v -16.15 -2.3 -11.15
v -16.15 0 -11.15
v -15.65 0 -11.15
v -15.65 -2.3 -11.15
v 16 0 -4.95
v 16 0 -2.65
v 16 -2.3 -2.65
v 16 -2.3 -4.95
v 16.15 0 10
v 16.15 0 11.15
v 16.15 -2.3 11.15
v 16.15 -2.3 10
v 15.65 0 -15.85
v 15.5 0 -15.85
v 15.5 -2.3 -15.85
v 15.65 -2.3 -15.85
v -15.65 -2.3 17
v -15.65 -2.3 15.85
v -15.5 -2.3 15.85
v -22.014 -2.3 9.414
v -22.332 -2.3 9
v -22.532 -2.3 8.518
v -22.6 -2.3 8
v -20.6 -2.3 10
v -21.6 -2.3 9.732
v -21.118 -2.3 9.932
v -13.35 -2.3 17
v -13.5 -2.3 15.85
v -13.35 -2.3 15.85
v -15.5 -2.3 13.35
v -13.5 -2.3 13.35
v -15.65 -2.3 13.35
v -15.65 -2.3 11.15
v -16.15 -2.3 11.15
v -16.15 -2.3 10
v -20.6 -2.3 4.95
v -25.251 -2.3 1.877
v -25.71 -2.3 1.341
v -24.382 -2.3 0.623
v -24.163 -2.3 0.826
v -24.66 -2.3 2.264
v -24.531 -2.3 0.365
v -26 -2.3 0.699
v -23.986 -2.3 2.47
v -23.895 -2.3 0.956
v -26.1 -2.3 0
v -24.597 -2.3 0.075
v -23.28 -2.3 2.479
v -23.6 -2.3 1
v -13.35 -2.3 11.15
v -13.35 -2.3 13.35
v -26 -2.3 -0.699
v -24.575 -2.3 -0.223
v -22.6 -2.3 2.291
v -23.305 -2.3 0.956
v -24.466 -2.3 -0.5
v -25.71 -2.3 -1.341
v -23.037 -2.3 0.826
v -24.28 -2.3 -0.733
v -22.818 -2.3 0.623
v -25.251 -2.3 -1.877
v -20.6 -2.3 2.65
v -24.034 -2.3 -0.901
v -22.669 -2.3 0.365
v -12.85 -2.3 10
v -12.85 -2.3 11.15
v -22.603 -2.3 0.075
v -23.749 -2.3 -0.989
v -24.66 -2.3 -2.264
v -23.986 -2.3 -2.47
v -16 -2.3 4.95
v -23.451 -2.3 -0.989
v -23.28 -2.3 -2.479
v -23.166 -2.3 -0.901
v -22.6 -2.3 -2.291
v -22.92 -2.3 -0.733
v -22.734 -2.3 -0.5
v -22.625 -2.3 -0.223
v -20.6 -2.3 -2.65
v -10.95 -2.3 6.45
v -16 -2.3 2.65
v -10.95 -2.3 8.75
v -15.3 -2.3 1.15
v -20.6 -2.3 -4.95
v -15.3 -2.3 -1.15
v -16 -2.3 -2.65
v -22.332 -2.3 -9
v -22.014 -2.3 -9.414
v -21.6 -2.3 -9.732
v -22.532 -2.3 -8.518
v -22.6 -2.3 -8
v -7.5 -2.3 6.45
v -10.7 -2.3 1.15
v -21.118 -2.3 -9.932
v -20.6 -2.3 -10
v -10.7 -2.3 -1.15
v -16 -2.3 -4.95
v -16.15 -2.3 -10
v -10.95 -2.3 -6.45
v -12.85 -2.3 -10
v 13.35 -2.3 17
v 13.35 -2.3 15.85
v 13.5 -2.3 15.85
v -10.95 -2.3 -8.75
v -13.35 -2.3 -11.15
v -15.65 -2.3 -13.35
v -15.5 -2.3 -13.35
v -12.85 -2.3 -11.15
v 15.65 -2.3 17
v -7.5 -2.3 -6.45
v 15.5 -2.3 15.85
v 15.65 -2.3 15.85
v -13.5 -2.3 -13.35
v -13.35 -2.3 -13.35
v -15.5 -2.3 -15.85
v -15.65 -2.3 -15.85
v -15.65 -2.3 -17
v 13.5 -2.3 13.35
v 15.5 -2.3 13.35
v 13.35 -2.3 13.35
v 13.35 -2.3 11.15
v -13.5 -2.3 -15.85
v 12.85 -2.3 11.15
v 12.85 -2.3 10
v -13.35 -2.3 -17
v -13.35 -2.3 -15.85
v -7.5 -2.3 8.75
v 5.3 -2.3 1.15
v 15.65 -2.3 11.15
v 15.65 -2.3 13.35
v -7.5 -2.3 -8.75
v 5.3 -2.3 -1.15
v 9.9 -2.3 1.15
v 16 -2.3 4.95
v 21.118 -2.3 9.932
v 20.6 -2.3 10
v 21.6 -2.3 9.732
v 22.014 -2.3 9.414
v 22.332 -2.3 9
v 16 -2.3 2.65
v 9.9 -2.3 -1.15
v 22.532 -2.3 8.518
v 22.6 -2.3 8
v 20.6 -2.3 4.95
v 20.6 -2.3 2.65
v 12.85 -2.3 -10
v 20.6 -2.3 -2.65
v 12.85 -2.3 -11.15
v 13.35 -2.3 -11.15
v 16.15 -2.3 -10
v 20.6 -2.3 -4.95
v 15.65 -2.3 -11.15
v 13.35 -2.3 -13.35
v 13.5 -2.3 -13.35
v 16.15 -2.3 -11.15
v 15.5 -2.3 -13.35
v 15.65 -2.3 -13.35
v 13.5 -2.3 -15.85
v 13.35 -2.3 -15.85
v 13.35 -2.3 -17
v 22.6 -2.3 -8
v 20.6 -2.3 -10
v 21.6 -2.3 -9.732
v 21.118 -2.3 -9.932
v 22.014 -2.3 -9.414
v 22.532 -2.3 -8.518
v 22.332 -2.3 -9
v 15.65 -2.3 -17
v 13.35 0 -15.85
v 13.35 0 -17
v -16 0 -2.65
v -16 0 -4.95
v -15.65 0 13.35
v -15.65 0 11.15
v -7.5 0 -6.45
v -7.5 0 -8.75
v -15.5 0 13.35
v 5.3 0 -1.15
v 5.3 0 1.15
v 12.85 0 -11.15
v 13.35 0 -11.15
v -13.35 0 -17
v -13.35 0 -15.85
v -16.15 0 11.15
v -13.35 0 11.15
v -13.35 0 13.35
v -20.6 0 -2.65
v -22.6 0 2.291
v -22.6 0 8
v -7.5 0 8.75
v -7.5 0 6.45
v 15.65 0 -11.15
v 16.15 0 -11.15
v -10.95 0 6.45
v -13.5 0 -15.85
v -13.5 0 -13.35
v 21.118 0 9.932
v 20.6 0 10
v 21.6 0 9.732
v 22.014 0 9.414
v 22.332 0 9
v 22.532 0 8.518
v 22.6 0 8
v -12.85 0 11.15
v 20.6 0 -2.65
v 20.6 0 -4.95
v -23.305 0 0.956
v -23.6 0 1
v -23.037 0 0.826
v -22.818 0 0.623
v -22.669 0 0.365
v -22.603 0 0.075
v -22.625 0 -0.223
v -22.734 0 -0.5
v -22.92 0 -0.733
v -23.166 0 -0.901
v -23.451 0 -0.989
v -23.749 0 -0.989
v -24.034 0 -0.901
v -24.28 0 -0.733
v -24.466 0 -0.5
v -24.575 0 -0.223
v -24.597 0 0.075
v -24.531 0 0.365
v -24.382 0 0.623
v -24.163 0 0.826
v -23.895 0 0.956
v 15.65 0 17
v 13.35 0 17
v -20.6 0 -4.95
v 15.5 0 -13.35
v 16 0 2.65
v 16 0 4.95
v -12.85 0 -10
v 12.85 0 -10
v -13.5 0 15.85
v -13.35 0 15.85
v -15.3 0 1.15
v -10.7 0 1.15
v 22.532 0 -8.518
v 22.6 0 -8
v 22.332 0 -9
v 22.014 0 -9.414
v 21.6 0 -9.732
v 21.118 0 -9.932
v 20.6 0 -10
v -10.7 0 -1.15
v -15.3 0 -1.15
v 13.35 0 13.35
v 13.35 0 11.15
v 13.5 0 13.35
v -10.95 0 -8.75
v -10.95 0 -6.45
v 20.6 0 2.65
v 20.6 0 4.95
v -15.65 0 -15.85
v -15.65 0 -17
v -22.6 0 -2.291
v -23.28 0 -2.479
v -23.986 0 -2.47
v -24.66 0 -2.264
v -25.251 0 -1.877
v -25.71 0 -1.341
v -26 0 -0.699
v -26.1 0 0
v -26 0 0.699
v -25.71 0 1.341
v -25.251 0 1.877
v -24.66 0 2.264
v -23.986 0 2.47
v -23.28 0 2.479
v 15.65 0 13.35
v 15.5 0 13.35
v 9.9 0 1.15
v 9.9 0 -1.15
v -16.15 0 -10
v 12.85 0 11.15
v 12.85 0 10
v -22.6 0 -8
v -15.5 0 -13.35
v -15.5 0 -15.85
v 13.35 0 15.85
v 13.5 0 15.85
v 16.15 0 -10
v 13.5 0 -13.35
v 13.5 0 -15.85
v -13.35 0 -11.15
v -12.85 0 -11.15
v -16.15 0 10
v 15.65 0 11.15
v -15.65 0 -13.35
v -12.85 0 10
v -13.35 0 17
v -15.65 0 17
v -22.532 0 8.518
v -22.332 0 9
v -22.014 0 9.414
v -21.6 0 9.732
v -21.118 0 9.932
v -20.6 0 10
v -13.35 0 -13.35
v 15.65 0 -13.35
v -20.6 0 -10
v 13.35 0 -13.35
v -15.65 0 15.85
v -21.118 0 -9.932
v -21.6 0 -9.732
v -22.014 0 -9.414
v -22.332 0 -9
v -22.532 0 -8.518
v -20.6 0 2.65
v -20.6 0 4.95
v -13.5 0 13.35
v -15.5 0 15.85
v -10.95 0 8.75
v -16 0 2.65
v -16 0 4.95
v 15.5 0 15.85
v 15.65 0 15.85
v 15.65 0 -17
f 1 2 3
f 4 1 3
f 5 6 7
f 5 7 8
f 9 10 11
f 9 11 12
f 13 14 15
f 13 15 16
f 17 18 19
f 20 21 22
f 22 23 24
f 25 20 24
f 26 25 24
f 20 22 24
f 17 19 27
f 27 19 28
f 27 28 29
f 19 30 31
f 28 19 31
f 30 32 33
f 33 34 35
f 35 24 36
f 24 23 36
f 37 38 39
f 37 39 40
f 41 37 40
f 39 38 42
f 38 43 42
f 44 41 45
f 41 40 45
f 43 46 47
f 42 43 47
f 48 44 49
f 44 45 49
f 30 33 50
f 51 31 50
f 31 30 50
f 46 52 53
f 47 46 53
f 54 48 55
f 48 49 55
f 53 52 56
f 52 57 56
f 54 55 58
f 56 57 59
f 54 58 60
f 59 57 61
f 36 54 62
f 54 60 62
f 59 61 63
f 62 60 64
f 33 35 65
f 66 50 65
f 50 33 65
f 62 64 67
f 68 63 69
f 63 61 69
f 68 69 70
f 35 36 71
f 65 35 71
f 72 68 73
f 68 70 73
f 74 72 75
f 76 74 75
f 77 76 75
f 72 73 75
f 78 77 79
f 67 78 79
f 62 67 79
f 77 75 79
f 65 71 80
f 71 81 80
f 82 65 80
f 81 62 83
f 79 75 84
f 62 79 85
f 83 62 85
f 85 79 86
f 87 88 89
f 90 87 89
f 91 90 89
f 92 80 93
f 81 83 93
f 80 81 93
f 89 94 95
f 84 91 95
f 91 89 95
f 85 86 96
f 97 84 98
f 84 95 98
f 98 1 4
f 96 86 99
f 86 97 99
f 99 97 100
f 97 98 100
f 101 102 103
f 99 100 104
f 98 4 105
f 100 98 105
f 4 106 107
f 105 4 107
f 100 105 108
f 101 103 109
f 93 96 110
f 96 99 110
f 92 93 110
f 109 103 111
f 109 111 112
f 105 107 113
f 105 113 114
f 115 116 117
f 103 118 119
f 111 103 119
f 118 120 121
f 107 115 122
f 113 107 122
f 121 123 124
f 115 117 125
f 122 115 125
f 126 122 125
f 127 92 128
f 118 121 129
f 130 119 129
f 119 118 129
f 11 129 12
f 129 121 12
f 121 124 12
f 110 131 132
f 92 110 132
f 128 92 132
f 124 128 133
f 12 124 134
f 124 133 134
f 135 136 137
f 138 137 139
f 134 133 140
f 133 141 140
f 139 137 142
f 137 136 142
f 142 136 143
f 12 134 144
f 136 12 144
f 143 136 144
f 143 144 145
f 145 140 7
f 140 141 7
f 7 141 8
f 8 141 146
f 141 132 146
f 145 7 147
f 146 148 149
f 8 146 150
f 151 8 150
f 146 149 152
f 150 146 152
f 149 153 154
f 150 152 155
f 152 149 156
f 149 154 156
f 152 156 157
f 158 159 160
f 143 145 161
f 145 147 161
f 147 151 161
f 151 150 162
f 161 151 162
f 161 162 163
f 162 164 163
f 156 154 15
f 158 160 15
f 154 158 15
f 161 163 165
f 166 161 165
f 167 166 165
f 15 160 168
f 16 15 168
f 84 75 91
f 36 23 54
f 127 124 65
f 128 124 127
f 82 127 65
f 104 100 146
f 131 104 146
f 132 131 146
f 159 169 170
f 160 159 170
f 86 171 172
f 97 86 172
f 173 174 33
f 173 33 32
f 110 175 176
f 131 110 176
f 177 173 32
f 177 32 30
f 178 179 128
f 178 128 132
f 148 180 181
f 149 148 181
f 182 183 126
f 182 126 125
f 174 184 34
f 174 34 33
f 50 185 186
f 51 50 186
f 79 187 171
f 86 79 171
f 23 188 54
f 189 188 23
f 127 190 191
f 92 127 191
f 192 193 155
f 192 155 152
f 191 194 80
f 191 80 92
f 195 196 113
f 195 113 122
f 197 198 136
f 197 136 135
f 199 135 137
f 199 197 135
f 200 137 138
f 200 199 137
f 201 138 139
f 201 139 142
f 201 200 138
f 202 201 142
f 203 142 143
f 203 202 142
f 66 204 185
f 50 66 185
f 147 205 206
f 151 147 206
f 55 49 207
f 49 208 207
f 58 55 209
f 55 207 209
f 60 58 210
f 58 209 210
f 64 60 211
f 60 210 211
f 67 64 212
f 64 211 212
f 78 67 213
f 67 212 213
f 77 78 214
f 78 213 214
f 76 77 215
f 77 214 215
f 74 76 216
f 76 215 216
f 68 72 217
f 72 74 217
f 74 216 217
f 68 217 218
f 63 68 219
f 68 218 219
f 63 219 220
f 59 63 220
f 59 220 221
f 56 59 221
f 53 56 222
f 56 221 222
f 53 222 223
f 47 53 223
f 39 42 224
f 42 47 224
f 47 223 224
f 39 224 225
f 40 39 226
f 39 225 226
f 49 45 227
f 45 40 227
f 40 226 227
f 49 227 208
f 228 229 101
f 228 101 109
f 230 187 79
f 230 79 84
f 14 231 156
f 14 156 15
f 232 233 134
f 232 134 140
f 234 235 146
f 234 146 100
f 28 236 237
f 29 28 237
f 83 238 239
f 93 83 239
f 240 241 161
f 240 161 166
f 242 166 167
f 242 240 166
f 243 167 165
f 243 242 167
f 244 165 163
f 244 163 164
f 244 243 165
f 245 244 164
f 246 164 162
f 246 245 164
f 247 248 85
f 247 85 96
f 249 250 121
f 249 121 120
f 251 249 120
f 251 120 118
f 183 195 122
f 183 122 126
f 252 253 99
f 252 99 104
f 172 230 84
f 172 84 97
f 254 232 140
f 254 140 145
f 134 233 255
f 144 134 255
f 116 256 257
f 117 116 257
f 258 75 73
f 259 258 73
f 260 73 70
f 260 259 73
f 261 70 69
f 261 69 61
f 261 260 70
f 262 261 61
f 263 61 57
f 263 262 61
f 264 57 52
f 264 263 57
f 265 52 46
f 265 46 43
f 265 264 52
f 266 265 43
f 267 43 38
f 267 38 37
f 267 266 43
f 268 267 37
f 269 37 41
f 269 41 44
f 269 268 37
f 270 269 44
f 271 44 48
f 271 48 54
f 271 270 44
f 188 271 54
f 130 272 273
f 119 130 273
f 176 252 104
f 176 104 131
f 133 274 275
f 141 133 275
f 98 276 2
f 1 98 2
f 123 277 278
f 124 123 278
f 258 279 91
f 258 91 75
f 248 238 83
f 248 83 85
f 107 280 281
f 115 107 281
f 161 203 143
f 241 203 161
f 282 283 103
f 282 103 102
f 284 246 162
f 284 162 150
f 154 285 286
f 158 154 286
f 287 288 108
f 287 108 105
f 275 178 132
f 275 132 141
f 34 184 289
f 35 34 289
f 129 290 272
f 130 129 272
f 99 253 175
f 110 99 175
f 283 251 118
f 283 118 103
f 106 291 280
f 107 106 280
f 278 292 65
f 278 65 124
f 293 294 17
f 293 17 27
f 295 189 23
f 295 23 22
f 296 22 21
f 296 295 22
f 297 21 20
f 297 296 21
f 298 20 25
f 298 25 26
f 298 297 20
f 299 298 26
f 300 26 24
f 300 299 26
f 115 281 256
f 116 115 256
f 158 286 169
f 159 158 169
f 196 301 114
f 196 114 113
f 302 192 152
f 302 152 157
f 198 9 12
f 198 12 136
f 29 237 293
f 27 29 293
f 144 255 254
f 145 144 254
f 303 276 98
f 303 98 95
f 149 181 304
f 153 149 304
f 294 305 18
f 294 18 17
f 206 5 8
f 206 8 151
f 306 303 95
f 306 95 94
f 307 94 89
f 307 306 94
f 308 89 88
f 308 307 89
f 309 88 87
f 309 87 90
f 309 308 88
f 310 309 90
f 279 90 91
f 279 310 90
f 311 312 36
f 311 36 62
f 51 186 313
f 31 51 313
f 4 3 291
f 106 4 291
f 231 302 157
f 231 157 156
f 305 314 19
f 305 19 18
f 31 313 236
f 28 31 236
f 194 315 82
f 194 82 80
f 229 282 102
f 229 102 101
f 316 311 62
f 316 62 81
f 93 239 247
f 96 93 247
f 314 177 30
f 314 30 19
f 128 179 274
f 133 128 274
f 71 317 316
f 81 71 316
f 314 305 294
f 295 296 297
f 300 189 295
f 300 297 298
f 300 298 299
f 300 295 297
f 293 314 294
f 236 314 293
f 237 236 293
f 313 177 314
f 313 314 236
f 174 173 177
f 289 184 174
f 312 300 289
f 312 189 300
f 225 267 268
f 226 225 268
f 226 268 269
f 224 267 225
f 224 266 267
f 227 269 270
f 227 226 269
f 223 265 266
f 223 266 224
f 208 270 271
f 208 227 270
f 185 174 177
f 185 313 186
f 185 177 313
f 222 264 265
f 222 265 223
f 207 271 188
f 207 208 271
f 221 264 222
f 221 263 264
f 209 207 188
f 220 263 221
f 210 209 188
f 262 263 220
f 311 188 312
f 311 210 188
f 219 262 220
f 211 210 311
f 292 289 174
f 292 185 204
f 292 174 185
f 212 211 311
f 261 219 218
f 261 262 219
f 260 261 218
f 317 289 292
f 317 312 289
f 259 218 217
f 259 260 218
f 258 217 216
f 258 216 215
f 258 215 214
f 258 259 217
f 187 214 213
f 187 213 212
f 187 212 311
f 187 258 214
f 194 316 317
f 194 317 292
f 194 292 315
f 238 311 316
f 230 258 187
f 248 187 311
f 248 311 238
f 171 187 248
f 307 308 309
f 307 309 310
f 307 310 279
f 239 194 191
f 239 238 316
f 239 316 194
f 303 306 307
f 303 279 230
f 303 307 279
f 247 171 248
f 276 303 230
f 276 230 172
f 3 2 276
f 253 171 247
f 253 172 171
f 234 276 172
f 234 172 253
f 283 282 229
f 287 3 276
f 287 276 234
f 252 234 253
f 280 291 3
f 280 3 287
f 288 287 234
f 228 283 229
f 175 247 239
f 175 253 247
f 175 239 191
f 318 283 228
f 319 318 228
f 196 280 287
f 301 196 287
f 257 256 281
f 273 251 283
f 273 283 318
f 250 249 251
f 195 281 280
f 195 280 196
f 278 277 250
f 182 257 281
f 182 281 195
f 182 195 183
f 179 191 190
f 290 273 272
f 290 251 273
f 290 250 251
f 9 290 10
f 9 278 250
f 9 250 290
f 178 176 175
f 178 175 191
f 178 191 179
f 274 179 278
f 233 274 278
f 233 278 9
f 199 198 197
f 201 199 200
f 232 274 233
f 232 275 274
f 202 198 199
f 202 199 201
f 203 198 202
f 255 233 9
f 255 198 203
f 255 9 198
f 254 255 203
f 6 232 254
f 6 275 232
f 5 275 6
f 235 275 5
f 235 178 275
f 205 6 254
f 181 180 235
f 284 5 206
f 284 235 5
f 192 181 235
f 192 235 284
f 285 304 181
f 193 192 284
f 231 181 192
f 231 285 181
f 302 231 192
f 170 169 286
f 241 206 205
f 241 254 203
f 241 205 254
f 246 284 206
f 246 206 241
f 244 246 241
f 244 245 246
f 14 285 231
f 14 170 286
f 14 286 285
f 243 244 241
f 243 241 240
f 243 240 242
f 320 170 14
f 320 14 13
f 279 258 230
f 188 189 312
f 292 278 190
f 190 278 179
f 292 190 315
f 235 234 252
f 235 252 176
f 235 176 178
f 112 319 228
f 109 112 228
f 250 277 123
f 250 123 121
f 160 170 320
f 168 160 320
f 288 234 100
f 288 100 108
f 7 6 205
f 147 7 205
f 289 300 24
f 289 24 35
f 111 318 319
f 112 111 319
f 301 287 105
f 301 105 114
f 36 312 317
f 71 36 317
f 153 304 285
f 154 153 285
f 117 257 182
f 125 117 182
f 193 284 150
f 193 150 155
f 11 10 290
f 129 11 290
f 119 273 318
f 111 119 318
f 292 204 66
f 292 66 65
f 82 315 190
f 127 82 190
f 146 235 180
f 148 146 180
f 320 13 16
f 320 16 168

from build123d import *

# Parameters (mm, degrees)
BASE_FLANGE1_DEPTH = 2.3
CUT_EXTRUDE2_REACH = 26.82
SKETCH12_W         = 4.6
SKETCH12_H         = 2.3
SKETCH12_W_2       = 3.45
SKETCH6_W          = 3.3
SKETCH6_H          = 7
TAB1_DEPTH         = 2.3
CUT_EXTRUDE1_REACH = 30.373
SKETCH10_R         = 2.5
SKETCH10_R_2       = 1
TAB2_DEPTH         = 2.3


# Sheet-metal steps are written as plain solids
with BuildPart() as part:
    # Sketch1 → Base-Flange1 (new body)
    with BuildSketch(Plane(origin=(0, 0, 0), x_dir=(1, 0, 0), z_dir=(0, 1, 0))):
        with BuildLine():
            Line((-20.6, -10), (20.6, -10))
            ThreePointArc((20.6, -10), (22.014213562, -9.414213562), (22.6, -8))
            Line((22.6, -8), (22.6, 8))
            ThreePointArc((22.6, 8), (22.014213562, 9.414213562), (20.6, 10))
            Line((20.6, 10), (-20.6, 10))
            ThreePointArc((-20.6, 10), (-22.014213562, 9.414213562), (-22.6, 8))
            Line((-22.6, 8), (-22.6, -8))
            ThreePointArc((-22.6, -8), (-22.014213562, -9.414213562), (-20.6, -10))
        make_face()
    extrude(amount=-BASE_FLANGE1_DEPTH)

    # Sketch12 → Cut-Extrude2 (cut, up to next)
    with BuildSketch(Plane(origin=(0, 0, 0), x_dir=(1, 0, 0), z_dir=(0, 1, 0)), mode=Mode.PRIVATE) as cut_extrude2_sk1:
        with Locations((-13, 0)):
            Rectangle(SKETCH12_W, SKETCH12_H)
    cut_extrude2_tool1 = extrude(cut_extrude2_sk1.sketch, amount=-CUT_EXTRUDE2_REACH, mode=Mode.PRIVATE) & part.part
    # Sketch12 → Cut-Extrude2 (cut, up to next)
    with BuildSketch(Plane(origin=(0, 0, 0), x_dir=(1, 0, 0), z_dir=(0, 1, 0)), mode=Mode.PRIVATE) as cut_extrude2_sk2:
        with Locations((7.6, 0)):
            Rectangle(SKETCH12_W, SKETCH12_H)
    cut_extrude2_tool2 = extrude(cut_extrude2_sk2.sketch, amount=-CUT_EXTRUDE2_REACH, mode=Mode.PRIVATE) & part.part
    # Sketch12 → Cut-Extrude2 (cut, up to next)
    with BuildSketch(Plane(origin=(0, 0, 0), x_dir=(1, 0, 0), z_dir=(0, 1, 0)), mode=Mode.PRIVATE) as cut_extrude2_sk3:
        with Locations((-18.3, 3.8)):
            Rectangle(SKETCH12_W, SKETCH12_H)
    cut_extrude2_tool3 = extrude(cut_extrude2_sk3.sketch, amount=-CUT_EXTRUDE2_REACH, mode=Mode.PRIVATE) & part.part
    # Sketch12 → Cut-Extrude2 (cut, up to next)
    with BuildSketch(Plane(origin=(0, 0, 0), x_dir=(1, 0, 0), z_dir=(0, 1, 0)), mode=Mode.PRIVATE) as cut_extrude2_sk4:
        with Locations((18.3, 3.8)):
            Rectangle(SKETCH12_W, SKETCH12_H)
    cut_extrude2_tool4 = extrude(cut_extrude2_sk4.sketch, amount=-CUT_EXTRUDE2_REACH, mode=Mode.PRIVATE) & part.part
    # Sketch12 → Cut-Extrude2 (cut, up to next)
    with BuildSketch(Plane(origin=(0, 0, 0), x_dir=(1, 0, 0), z_dir=(0, 1, 0)), mode=Mode.PRIVATE) as cut_extrude2_sk5:
        with Locations((-18.3, -3.8)):
            Rectangle(SKETCH12_W, SKETCH12_H)
    cut_extrude2_tool5 = extrude(cut_extrude2_sk5.sketch, amount=-CUT_EXTRUDE2_REACH, mode=Mode.PRIVATE) & part.part
    # Sketch12 → Cut-Extrude2 (cut, up to next)
    with BuildSketch(Plane(origin=(0, 0, 0), x_dir=(1, 0, 0), z_dir=(0, 1, 0)), mode=Mode.PRIVATE) as cut_extrude2_sk6:
        with Locations((18.3, -3.8)):
            Rectangle(SKETCH12_W, SKETCH12_H)
    cut_extrude2_tool6 = extrude(cut_extrude2_sk6.sketch, amount=-CUT_EXTRUDE2_REACH, mode=Mode.PRIVATE) & part.part
    # Sketch12 → Cut-Extrude2 (cut, up to next)
    with BuildSketch(Plane(origin=(0, 0, 0), x_dir=(1, 0, 0), z_dir=(0, 1, 0)), mode=Mode.PRIVATE) as cut_extrude2_sk7:
        with Locations((-9.225, 7.6)):
            Rectangle(SKETCH12_W_2, SKETCH12_H)
    cut_extrude2_tool7 = extrude(cut_extrude2_sk7.sketch, amount=-CUT_EXTRUDE2_REACH, mode=Mode.PRIVATE) & part.part
    # Sketch12 → Cut-Extrude2 (cut, up to next)
    with BuildSketch(Plane(origin=(0, 0, 0), x_dir=(1, 0, 0), z_dir=(0, 1, 0)), mode=Mode.PRIVATE) as cut_extrude2_sk8:
        with Locations((-9.225, -7.6)):
            Rectangle(SKETCH12_W_2, SKETCH12_H)
    cut_extrude2_tool8 = extrude(cut_extrude2_sk8.sketch, amount=-CUT_EXTRUDE2_REACH, mode=Mode.PRIVATE) & part.part
    add(cut_extrude2_tool1.solids().sort_by_distance((-13, 0, 0))[0], mode=Mode.SUBTRACT)
    add(cut_extrude2_tool2.solids().sort_by_distance((7.6, 0, 0))[0], mode=Mode.SUBTRACT)
    add(cut_extrude2_tool3.solids().sort_by_distance((-18.3, 0, -3.8))[0], mode=Mode.SUBTRACT)
    add(cut_extrude2_tool4.solids().sort_by_distance((18.3, 0, -3.8))[0], mode=Mode.SUBTRACT)
    add(cut_extrude2_tool5.solids().sort_by_distance((-18.3, 0, 3.8))[0], mode=Mode.SUBTRACT)
    add(cut_extrude2_tool6.solids().sort_by_distance((18.3, 0, 3.8))[0], mode=Mode.SUBTRACT)
    add(cut_extrude2_tool7.solids().sort_by_distance((-9.225, 0, -7.6))[0], mode=Mode.SUBTRACT)
    add(cut_extrude2_tool8.solids().sort_by_distance((-9.225, 0, 7.6))[0], mode=Mode.SUBTRACT)

    # Sketch6 → Tab1 (add)
    with BuildSketch(Plane(origin=(0, 0, 0), x_dir=(1, 0, 0), z_dir=(0, 1, 0))):
        with Locations((-14.5, 13.5)):
            Rectangle(SKETCH6_W, SKETCH6_H)
        with Locations((14.5, 13.5)):
            Rectangle(SKETCH6_W, SKETCH6_H)
        with Locations((14.5, -13.5)):
            Rectangle(SKETCH6_W, SKETCH6_H)
        with Locations((-14.5, -13.5)):
            Rectangle(SKETCH6_W, SKETCH6_H)
    extrude(amount=-TAB1_DEPTH)

    # Sketch9 → Cut-Extrude1 (cut, up to next)
    with BuildSketch(Plane(origin=(0, 0, 0), x_dir=(1, 0, 0), z_dir=(0, 1, 0)), mode=Mode.PRIVATE) as cut_extrude1_sk1:
        Polygon((-12.85, 11.15), (-13.35, 11.15), (-13.35, 13.35), (-13.5, 13.35), (-13.5, 15.85), (-13.35, 15.85), (-13.35, 17), (-12.85, 17), align=None)
    cut_extrude1_tool1 = extrude(cut_extrude1_sk1.sketch, amount=-CUT_EXTRUDE1_REACH, mode=Mode.PRIVATE) & part.part
    # Sketch9 → Cut-Extrude1 (cut, up to next)
    with BuildSketch(Plane(origin=(0, 0, 0), x_dir=(1, 0, 0), z_dir=(0, 1, 0)), mode=Mode.PRIVATE) as cut_extrude1_sk2:
        Polygon((-16.15, 17), (-16.15, 11.15), (-15.65, 11.15), (-15.65, 13.35), (-15.5, 13.35), (-15.5, 15.85), (-15.65, 15.85), (-15.65, 17), align=None)
    cut_extrude1_tool2 = extrude(cut_extrude1_sk2.sketch, amount=-CUT_EXTRUDE1_REACH, mode=Mode.PRIVATE) & part.part
    # Sketch9 → Cut-Extrude1 (cut, up to next)
    with BuildSketch(Plane(origin=(0, 0, 0), x_dir=(1, 0, 0), z_dir=(0, 1, 0)), mode=Mode.PRIVATE) as cut_extrude1_sk3:
        Polygon((-16.15, -11.15), (-15.65, -11.15), (-15.65, -13.35), (-15.5, -13.35), (-15.5, -15.85), (-15.65, -15.85), (-15.65, -17), (-16.15, -17), align=None)
    cut_extrude1_tool3 = extrude(cut_extrude1_sk3.sketch, amount=-CUT_EXTRUDE1_REACH, mode=Mode.PRIVATE) & part.part
    # Sketch9 → Cut-Extrude1 (cut, up to next)
    with BuildSketch(Plane(origin=(0, 0, 0), x_dir=(1, 0, 0), z_dir=(0, 1, 0)), mode=Mode.PRIVATE) as cut_extrude1_sk4:
        Polygon((-12.85, -17), (-12.85, -11.15), (-13.35, -11.15), (-13.35, -13.35), (-13.5, -13.35), (-13.5, -15.85), (-13.35, -15.85), (-13.35, -17), align=None)
    cut_extrude1_tool4 = extrude(cut_extrude1_sk4.sketch, amount=-CUT_EXTRUDE1_REACH, mode=Mode.PRIVATE) & part.part
    # Sketch9 → Cut-Extrude1 (cut, up to next)
    with BuildSketch(Plane(origin=(0, 0, 0), x_dir=(1, 0, 0), z_dir=(0, 1, 0)), mode=Mode.PRIVATE) as cut_extrude1_sk5:
        Polygon((12.85, -11.15), (13.35, -11.15), (13.35, -13.35), (13.5, -13.35), (13.5, -15.85), (13.35, -15.85), (13.35, -17), (12.85, -17), align=None)
    cut_extrude1_tool5 = extrude(cut_extrude1_sk5.sketch, amount=-CUT_EXTRUDE1_REACH, mode=Mode.PRIVATE) & part.part
    # Sketch9 → Cut-Extrude1 (cut, up to next)
    with BuildSketch(Plane(origin=(0, 0, 0), x_dir=(1, 0, 0), z_dir=(0, 1, 0)), mode=Mode.PRIVATE) as cut_extrude1_sk6:
        Polygon((16.15, -17), (16.15, -11.15), (15.65, -11.15), (15.65, -13.35), (15.5, -13.35), (15.5, -15.85), (15.65, -15.85), (15.65, -17), align=None)
    cut_extrude1_tool6 = extrude(cut_extrude1_sk6.sketch, amount=-CUT_EXTRUDE1_REACH, mode=Mode.PRIVATE) & part.part
    # Sketch9 → Cut-Extrude1 (cut, up to next)
    with BuildSketch(Plane(origin=(0, 0, 0), x_dir=(1, 0, 0), z_dir=(0, 1, 0)), mode=Mode.PRIVATE) as cut_extrude1_sk7:
        Polygon((12.85, 17), (12.85, 11.15), (13.35, 11.15), (13.35, 13.35), (13.5, 13.35), (13.5, 15.85), (13.35, 15.85), (13.35, 17), align=None)
    cut_extrude1_tool7 = extrude(cut_extrude1_sk7.sketch, amount=-CUT_EXTRUDE1_REACH, mode=Mode.PRIVATE) & part.part
    # Sketch9 → Cut-Extrude1 (cut, up to next)
    with BuildSketch(Plane(origin=(0, 0, 0), x_dir=(1, 0, 0), z_dir=(0, 1, 0)), mode=Mode.PRIVATE) as cut_extrude1_sk8:
        Polygon((16.15, 11.15), (15.65, 11.15), (15.65, 13.35), (15.5, 13.35), (15.5, 15.85), (15.65, 15.85), (15.65, 17), (16.15, 17), align=None)
    cut_extrude1_tool8 = extrude(cut_extrude1_sk8.sketch, amount=-CUT_EXTRUDE1_REACH, mode=Mode.PRIVATE) & part.part
    add(cut_extrude1_tool1.solids().sort_by_distance((-13.136932, 0, -14.134659))[0], mode=Mode.SUBTRACT)
    add(cut_extrude1_tool2.solids().sort_by_distance((-15.863068, 0, -14.134659))[0], mode=Mode.SUBTRACT)
    add(cut_extrude1_tool3.solids().sort_by_distance((-15.863068, 0, 14.134659))[0], mode=Mode.SUBTRACT)
    add(cut_extrude1_tool4.solids().sort_by_distance((-13.136932, 0, 14.134659))[0], mode=Mode.SUBTRACT)
    add(cut_extrude1_tool5.solids().sort_by_distance((13.136932, 0, 14.134659))[0], mode=Mode.SUBTRACT)
    add(cut_extrude1_tool6.solids().sort_by_distance((15.863068, 0, 14.134659))[0], mode=Mode.SUBTRACT)
    add(cut_extrude1_tool7.solids().sort_by_distance((13.136932, 0, -14.134659))[0], mode=Mode.SUBTRACT)
    add(cut_extrude1_tool8.solids().sort_by_distance((15.863068, 0, -14.134659))[0], mode=Mode.SUBTRACT)

    # Sketch10 → Tab2 (add)
    with BuildSketch(Plane(origin=(0, 0, 0), x_dir=(1, 0, 0), z_dir=(0, 1, 0))):
        with Locations((-23.6, 0)):
            Circle(SKETCH10_R)
        with Locations(Location((-23.6, 0, 0), (0, 0, 270))):
            Circle(SKETCH10_R_2, mode=Mode.SUBTRACT)
    extrude(amount=-TAB2_DEPTH)


solid = part.part
